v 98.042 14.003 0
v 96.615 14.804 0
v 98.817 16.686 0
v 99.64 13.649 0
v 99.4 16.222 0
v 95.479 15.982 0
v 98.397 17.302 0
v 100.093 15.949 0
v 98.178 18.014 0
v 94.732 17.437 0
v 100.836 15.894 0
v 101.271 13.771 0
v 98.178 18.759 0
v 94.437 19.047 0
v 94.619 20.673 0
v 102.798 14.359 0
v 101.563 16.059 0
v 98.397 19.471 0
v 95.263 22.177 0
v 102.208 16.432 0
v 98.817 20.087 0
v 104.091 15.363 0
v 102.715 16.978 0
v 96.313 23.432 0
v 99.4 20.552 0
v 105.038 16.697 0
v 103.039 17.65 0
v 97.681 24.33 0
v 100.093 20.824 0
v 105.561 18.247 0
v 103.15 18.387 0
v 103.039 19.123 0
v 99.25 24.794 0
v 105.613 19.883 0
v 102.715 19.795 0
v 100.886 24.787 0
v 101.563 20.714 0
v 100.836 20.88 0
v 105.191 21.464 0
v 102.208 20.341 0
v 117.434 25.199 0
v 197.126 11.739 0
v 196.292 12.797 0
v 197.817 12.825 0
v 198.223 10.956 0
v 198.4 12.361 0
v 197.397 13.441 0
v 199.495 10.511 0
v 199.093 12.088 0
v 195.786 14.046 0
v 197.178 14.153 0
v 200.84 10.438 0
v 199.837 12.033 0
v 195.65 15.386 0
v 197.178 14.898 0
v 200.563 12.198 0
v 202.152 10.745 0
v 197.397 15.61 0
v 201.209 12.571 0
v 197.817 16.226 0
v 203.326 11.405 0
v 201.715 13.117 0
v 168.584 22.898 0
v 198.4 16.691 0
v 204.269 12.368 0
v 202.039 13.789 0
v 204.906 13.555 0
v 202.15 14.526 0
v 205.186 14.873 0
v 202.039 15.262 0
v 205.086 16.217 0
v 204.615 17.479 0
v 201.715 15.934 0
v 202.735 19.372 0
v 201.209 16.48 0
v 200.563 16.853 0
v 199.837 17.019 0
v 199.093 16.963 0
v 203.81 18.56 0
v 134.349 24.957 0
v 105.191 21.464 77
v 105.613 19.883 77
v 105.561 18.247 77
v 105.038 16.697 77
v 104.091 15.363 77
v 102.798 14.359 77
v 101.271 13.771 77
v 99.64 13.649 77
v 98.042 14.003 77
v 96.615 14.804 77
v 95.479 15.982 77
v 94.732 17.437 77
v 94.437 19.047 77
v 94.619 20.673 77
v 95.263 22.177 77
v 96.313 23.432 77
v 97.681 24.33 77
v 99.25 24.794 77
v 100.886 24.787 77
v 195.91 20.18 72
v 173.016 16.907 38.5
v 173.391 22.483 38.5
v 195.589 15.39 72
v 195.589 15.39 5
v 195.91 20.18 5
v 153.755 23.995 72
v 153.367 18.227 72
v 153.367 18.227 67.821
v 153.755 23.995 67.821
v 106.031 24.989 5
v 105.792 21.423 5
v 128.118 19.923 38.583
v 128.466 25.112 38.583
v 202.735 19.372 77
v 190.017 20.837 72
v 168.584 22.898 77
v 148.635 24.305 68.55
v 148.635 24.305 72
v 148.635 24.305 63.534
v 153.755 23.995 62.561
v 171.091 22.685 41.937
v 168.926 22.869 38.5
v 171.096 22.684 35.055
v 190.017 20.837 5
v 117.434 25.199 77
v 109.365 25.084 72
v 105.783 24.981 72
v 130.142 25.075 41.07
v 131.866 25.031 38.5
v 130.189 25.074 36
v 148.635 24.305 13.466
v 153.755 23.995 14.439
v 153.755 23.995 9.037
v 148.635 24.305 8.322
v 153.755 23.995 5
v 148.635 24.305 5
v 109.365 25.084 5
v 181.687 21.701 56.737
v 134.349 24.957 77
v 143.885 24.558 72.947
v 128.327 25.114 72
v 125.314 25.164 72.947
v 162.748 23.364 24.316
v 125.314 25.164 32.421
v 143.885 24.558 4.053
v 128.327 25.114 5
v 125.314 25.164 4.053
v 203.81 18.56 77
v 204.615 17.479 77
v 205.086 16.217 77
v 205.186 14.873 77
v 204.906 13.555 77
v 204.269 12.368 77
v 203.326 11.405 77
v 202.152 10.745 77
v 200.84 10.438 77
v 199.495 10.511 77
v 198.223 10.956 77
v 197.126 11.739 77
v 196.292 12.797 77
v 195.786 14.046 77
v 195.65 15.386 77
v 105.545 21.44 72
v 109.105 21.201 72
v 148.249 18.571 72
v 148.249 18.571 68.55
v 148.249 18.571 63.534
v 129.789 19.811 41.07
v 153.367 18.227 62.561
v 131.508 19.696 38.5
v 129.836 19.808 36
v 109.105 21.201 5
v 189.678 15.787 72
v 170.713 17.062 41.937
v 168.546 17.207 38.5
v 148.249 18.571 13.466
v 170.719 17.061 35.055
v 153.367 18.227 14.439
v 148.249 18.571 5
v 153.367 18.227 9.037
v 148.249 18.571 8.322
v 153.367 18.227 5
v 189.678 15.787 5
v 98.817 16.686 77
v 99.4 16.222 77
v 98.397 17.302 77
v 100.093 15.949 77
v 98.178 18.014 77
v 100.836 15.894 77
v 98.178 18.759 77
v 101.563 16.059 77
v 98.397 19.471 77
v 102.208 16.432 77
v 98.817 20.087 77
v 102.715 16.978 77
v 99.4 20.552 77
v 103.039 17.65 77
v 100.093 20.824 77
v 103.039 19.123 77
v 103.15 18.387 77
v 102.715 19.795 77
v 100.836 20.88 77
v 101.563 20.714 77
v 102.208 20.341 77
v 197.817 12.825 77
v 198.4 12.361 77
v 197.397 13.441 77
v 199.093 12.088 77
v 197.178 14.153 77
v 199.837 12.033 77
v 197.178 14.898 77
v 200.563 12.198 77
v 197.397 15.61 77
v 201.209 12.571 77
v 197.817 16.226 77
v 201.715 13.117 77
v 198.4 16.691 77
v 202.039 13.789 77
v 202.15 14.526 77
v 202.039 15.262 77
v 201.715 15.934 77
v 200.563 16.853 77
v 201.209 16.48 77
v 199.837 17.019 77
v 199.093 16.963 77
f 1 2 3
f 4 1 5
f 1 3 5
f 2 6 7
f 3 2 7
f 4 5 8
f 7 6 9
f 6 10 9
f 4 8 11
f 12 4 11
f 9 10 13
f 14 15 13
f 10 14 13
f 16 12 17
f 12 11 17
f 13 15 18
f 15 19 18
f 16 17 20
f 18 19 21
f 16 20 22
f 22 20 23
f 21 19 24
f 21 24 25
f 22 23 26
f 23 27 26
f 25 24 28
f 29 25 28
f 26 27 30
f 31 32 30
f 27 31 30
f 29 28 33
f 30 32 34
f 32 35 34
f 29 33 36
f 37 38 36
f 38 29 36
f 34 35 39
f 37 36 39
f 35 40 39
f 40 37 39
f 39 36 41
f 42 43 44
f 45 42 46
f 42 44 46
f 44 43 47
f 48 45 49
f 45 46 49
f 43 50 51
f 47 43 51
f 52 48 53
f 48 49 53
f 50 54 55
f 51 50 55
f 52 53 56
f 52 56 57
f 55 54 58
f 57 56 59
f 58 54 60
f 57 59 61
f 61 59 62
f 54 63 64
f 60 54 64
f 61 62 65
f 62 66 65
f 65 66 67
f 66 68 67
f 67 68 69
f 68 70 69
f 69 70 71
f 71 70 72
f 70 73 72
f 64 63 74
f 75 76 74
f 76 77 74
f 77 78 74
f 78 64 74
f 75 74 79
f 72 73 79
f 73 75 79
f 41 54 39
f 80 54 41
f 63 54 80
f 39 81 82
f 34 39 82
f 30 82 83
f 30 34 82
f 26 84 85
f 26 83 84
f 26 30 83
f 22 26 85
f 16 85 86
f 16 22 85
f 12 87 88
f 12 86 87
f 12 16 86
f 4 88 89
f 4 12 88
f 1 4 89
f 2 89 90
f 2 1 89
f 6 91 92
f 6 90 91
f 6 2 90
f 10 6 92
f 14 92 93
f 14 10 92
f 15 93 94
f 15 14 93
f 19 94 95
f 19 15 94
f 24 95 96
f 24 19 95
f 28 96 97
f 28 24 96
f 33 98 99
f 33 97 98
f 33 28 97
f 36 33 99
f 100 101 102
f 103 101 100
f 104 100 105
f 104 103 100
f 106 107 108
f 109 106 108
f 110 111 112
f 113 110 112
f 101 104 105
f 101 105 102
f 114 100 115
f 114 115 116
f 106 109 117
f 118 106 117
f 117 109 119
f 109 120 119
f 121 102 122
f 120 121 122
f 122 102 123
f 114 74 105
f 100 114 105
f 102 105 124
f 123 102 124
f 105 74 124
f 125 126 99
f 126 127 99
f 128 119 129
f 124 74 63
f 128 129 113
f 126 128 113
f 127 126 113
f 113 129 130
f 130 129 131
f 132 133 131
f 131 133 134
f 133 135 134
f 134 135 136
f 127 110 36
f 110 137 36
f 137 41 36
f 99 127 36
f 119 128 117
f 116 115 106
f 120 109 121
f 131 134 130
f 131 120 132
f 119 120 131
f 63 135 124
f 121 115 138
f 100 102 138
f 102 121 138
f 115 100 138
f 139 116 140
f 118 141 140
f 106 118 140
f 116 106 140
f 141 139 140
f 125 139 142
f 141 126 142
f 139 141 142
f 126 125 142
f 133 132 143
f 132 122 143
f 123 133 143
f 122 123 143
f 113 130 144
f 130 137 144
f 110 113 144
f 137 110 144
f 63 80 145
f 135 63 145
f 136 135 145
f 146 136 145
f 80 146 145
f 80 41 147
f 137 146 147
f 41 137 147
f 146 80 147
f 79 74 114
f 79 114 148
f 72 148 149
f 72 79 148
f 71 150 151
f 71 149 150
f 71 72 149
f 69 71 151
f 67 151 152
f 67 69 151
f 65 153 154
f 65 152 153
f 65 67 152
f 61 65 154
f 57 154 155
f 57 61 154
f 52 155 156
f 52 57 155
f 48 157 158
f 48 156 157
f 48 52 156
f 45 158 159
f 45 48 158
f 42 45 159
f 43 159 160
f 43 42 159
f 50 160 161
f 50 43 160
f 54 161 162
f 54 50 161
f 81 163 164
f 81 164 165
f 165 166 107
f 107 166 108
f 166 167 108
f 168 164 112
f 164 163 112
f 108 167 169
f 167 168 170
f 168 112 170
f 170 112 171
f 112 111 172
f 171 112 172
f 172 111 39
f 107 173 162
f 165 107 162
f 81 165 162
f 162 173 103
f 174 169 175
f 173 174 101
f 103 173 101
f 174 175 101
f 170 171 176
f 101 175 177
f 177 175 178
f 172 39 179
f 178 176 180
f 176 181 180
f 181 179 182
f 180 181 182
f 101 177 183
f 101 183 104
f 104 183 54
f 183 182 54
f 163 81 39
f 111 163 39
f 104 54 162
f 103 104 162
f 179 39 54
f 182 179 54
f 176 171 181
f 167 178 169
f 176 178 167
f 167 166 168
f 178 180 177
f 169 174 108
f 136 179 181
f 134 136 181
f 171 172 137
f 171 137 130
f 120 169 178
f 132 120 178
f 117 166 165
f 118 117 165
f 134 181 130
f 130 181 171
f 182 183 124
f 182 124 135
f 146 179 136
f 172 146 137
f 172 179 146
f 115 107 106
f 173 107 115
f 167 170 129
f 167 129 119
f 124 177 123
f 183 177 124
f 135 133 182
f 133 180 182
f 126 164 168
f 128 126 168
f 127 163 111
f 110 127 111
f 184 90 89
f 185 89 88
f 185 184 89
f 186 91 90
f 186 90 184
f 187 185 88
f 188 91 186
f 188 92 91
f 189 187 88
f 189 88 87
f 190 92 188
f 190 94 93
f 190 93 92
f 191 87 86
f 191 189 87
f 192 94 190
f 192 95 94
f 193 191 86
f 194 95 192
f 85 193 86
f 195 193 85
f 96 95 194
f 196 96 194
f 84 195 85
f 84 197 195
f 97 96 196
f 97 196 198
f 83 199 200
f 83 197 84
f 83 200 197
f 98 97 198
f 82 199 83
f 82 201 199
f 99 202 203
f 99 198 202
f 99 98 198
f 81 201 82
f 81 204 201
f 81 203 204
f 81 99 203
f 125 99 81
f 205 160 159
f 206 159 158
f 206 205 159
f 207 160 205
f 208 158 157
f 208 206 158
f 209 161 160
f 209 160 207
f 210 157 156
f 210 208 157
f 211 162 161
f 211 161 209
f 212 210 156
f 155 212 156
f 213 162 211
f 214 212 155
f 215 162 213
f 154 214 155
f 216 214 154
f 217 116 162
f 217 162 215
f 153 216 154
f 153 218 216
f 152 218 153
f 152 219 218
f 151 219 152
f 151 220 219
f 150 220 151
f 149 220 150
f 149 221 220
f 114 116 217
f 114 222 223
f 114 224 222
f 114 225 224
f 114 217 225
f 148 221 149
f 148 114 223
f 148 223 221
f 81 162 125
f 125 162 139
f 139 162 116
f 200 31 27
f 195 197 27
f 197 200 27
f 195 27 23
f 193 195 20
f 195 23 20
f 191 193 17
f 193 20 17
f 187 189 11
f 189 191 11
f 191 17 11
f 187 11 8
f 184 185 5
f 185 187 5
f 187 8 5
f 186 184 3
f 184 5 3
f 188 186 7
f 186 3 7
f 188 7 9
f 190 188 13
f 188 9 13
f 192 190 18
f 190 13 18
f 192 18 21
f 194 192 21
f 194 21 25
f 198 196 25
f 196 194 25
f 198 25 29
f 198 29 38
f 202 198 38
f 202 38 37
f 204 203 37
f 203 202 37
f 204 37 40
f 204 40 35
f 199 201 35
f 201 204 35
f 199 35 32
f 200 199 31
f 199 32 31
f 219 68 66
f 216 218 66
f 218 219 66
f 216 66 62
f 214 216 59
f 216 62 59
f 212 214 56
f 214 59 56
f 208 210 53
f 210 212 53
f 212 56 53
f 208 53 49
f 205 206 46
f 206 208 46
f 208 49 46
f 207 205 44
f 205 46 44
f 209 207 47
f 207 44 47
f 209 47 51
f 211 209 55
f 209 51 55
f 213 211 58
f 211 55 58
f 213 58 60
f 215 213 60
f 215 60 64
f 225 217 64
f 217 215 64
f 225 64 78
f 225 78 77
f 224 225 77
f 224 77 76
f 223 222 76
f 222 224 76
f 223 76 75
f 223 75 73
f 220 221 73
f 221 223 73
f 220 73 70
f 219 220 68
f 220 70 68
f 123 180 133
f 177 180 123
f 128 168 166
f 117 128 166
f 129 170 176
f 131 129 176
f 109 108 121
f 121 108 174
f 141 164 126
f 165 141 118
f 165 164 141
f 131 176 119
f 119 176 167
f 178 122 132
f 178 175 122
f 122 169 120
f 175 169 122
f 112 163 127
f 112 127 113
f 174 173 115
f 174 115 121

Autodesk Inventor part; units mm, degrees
ref_plane "YZ Plane" through (0, 0, 0) normal (1, 0, 0) x (0, 1, 0)
ref_plane "XZ Plane" through (0, 0, 0) normal (0, 1, 0) x (-1, 0, 0)
ref_plane "XY Plane" through (0, 0, 0) normal (0, 0, 1) x (1, 0, 0)
sketch "Sketch2" plane through (0, 0, 0) normal (0, 0, 1) x (1, 0, 0)
  spline S0 degree 5 number of poles 204
  circle A0 centre (79.5137, 4.5678) radius 15.1135
  line L0 (79.5137, 4.5678) -> (79.5137, -15.4763) construction
  line L1 (79.5137, 4.5678) -> (209.6498, 4.5678) construction
  line L2 (319.6498, 0.0573) -> (219.6498, 0.0573) construction
  line L3 (219.6499, 18.7671) -> (219.6499, 18.7671) construction
  line L4 (28.0055, 4.5054) -> (28.0055, -2.4946)
  line L5 (19.6272, 1.0326) -> (319.6498, 0.0573) construction
  line L6 (49.7105, 14.4213) -> (55.6079, 14.4213)
  line L7 (49.7104, -8.4915) -> (55.6078, -8.4915)
  line L8 (28.0055, 4.5054) -> (49.7105, 14.4213)
  line L9 (28.0055, -2.4946) -> (49.7104, -8.4915)
  line L10 (55.6079, 14.4213) -> (55.6079, 20.8729)
  line L11 (55.6078, -8.4915) -> (55.6078, -14.1513)
  line L12 (108.6496, 16.3299) -> (108.6496, -7.1942)
  line L13 (110.8735, -9.1817) -> (193.8736, 0.1678)
  line L14 (195.6498, 2.1552) -> (195.6498, 6.9805)
  arc A1 (108.6496, -7.1942) -> (110.8735, -9.1817) centre (110.6496, -7.1942) ccw
  arc A2 (193.8736, 0.1678) -> (195.6498, 2.1552) centre (193.6498, 2.1552) ccw
  circle A3 centre (209.6498, 0.0573) radius 6.214
  line L15 (108.6496, 18.5678) -> (195.6498, 8.7678)
  circle A4 centre (100.6496, 18.3866) radius 2.5
  circle A5 centre (199.6498, 14.5256) radius 2.5
  spline S1 degree 4 poles (202.7347, 19.3724) (199.838, 19.7251) (195.7649, 20.2061) (190.5032, 20.7952) (184.0435, 21.4697) (179.3239, 21.937) (174.5933, 22.3806) (169.8562, 22.7962) (165.1183, 23.1863) (160.3828, 23.5463) (155.6566, 23.8767) (150.936, 24.1762) (146.2498, 24.4444) (141.5311, 24.676) (136.9019, 24.8782) (132.2312, 25.0296) (127.6189, 25.1375) (123.0371, 25.1982) (118.5028, 25.2125) (112.3622, 25.1677) (107.3995, 25.0507) (103.5849, 24.9119) (100.8865, 24.7866) knots 0 0 0 0 0 0.114234 0.16008 0.206003 0.251978 0.297982 0.343994 0.389991 0.435949 0.481846 0.527693 0.573431 0.619092 0.664656 0.710064 0.755333 0.800383 0.845191 0.889734 1 1 1 1 1
  line L16 (105.191, 21.4637) -> (195.6498, 15.3862)
  arc A6 (100.8865, 24.7866) -> (105.191, 21.4637) centre (100.0416, 19.2427) ccw
  arc A7 (195.6498, 15.3862) -> (202.7347, 19.3724) centre (200.4212, 15.1951) ccw
  point P0 (0, 0)
  point P1 (319.5771, 0.0748)
  point P2 (319.3573, 0.1272)
  point P3 (318.9916, 0.2136)
  point P4 (318.4804, 0.3362)
  point P5 (317.8238, 0.4909)
  point P6 (317.0222, 0.6802)
  point P7 (316.0769, 0.9024)
  point P8 (314.9885, 1.1569)
  point P9 (313.7582, 1.443)
  point P10 (312.3866, 1.7598)
  point P11 (310.8752, 2.1063)
  point P12 (309.2258, 2.4819)
  point P13 (307.4393, 2.8854)
  point P14 (305.5178, 3.3153)
  point P15 (303.4628, 3.7707)
  point P16 (301.2764, 4.2501)
  point P17 (298.9607, 4.7526)
  point P18 (296.5175, 5.2764)
  point P19 (293.9492, 5.8203)
  point P20 (291.2585, 6.3828)
  point P21 (288.4478, 6.9627)
  point P22 (285.5195, 7.5582)
  point P23 (282.4766, 8.1678)
  point P24 (279.3218, 8.79)
  point P25 (276.0584, 9.4236)
  point P26 (272.6891, 10.0668)
  point P27 (269.2175, 10.7178)
  point P28 (265.6469, 11.3757)
  point P29 (261.9803, 12.0381)
  point P30 (258.2219, 12.7041)
  point P31 (254.3747, 13.3722)
  point P32 (250.4426, 14.0403)
  point P33 (246.4295, 14.7072)
  point P34 (242.339, 15.3714)
  point P35 (238.1756, 16.0311)
  point P36 (233.9428, 16.6851)
  point P37 (229.6454, 17.3316)
  point P38 (225.2869, 17.9694)
  point P39 (220.8723, 18.5967)
  point P40 (216.4049, 19.2123)
  point P41 (211.8901, 19.8144)
  point P42 (207.332, 20.4015)
  point P43 (202.7347, 20.9724)
  point P44 (198.1034, 21.5256)
  point P45 (193.4423, 22.0596)
  point P46 (188.7563, 22.5726)
  point P47 (184.0499, 23.0637)
  point P48 (179.3279, 23.5314)
  point P49 (174.5948, 23.9745)
  point P50 (169.8554, 24.3909)
  point P51 (165.1148, 24.7803)
  point P52 (160.3775, 25.1406)
  point P53 (155.6479, 25.4709)
  point P54 (150.9316, 25.7703)
  point P55 (146.233, 26.0373)
  point P56 (141.557, 26.2707)
  point P57 (136.8821, 26.4681)
  point P58 (132.2209, 26.6211)
  point P59 (127.5964, 26.7282)
  point P60 (123.0133, 26.7888)
  point P61 (118.4761, 26.8026)
  point P62 (113.9902, 26.7693)
  point P63 (109.5601, 26.6886)
  point P64 (105.191, 26.5611)
  point P65 (100.8865, 26.3866)
  point P66 (96.6524, 26.1647)
  point P67 (92.4927, 25.8975)
  point P68 (88.412, 25.5858)
  point P69 (84.409, 25.3061)
  point P70 (80.8803, 24.9766)
  point P71 (76.6761, 24.4558)
  point P72 (72.9631, 23.8932)
  point P73 (69.3402, 23.3612)
  point P74 (65.8208, 22.7938)
  point P75 (62.4086, 22.1884)
  point P76 (59.1071, 21.5462)
  point P77 (52.8493, 20.1606)
  point P78 (49.7107, 19.4213)
  point P79 (47.0737, 18.6508)
  point P80 (44.3741, 17.8542)
  point P81 (41.8033, 17.0323)
  point P82 (39.3638, 16.1875)
  point P83 (37.0582, 15.3214)
  point P84 (34.8883, 14.4364)
  point P85 (32.8567, 13.534)
  point P86 (30.9649, 12.6166)
  point P87 (29.2144, 11.686)
  point P88 (27.607, 10.7437)
  point P89 (26.1442, 9.7921)
  point P90 (24.8269, 8.8324)
  point P91 (23.6566, 7.8664)
  point P92 (22.6337, 6.8952)
  point P93 (21.7592, 5.9208)
  point P94 (21.0335, 4.944)
  point P95 (20.4573, 3.966)
  point P96 (20.031, 2.9874)
  point P97 (19.7541, 2.0097)
  point P98 (19.6496, 0.0598)
  point P99 (19.8207, -0.9032)
  point P100 (20.1378, -1.8356)
  point P101 (20.6004, -2.7401)
  point P102 (21.2081, -3.6158)
  point P103 (21.9599, -4.4627)
  point P104 (22.8545, -5.2806)
  point P105 (23.891, -6.069)
  point P106 (25.0682, -6.8277)
  point P107 (26.3845, -7.5561)
  point P108 (27.8383, -8.2539)
  point P109 (29.4283, -8.9211)
  point P110 (31.1522, -9.5571)
  point P111 (33.0086, -10.1613)
  point P112 (34.9949, -10.734)
  point P113 (37.1093, -11.2746)
  point P114 (39.3497, -11.7828)
  point P115 (41.7134, -12.2586)
  point P116 (44.1979, -12.702)
  point P117 (46.8014, -13.1127)
  point P118 (49.7105, -13.4915)
  point P119 (52.3532, -13.8357)
  point P120 (58.3469, -14.4294)
  point P121 (61.5023, -14.678)
  point P122 (64.7591, -14.8953)
  point P123 (68.1149, -15.0813)
  point P124 (71.5661, -15.237)
  point P125 (75.1094, -15.3627)
  point P126 (78.7418, -15.4596)
  point P127 (82.46, -15.528)
  point P128 (86.2607, -15.5691)
  point P129 (90.14, -15.5838)
  point P130 (94.0946, -15.5733)
  point P131 (98.1212, -15.5388)
  point P132 (102.2159, -15.4812)
  point P133 (106.3751, -15.4023)
  point P134 (110.5952, -15.303)
  point P135 (114.872, -15.1845)
  point P136 (119.2022, -15.0489)
  point P137 (123.5813, -14.8971)
  point P138 (128.006, -14.7306)
  point P139 (132.4718, -14.5509)
  point P140 (136.9748, -14.3598)
  point P141 (141.5285, -14.1576)
  point P142 (146.1365, -13.9383)
  point P143 (150.7679, -13.7022)
  point P144 (155.4191, -13.4499)
  point P145 (160.0853, -13.1829)
  point P146 (164.7617, -12.9024)
  point P147 (169.4444, -12.6099)
  point P148 (174.1283, -12.306)
  point P149 (178.8092, -11.9925)
  point P150 (183.4823, -11.67)
  point P151 (188.1434, -11.34)
  point P152 (192.7877, -11.0037)
  point P153 (197.4107, -10.6614)
  point P154 (202.0079, -10.3149)
  point P155 (206.5747, -9.9645)
  point P156 (211.1069, -9.6117)
  point P157 (215.5999, -9.2568)
  point P158 (220.0489, -8.9007)
  point P159 (224.4503, -8.5446)
  point P160 (228.7987, -8.1885)
  point P161 (233.0906, -7.8339)
  point P162 (237.3214, -7.4808)
  point P163 (241.4866, -7.1298)
  point P164 (245.5828, -6.7821)
  point P165 (249.6052, -6.4377)
  point P166 (253.5502, -6.0972)
  point P167 (257.4136, -5.7612)
  point P168 (261.1915, -5.4303)
  point P169 (264.88, -5.1051)
  point P170 (268.4758, -4.7856)
  point P171 (271.9747, -4.4724)
  point P172 (275.3734, -4.1661)
  point P173 (278.6686, -3.867)
  point P174 (281.8564, -3.5757)
  point P175 (284.9344, -3.2925)
  point P176 (287.8984, -3.018)
  point P177 (290.7463, -2.7525)
  point P178 (293.4745, -2.4963)
  point P179 (296.0806, -2.2503)
  point P180 (298.5616, -2.0142)
  point P181 (300.9151, -1.7892)
  point P182 (303.1387, -1.575)
  point P183 (305.23, -1.3728)
  point P184 (307.1866, -1.1823)
  point P185 (309.007, -1.0041)
  point P186 (310.6885, -0.8385)
  point P187 (312.2302, -0.6861)
  point P188 (313.6297, -0.5471)
  point P189 (314.8861, -0.4221)
  point P190 (315.9976, -0.3107)
  point P191 (316.9636, -0.214)
  point P192 (317.7826, -0.1311)
  point P193 (318.4538, -0.0643)
  point P194 (318.9765, -0.0102)
  point P195 (319.3503, 0.027)
  point P196 (319.5743, 0.0497)
  point P197 (28.0055, 1.0054)
  point P198 (108.6496, -9.4322)
  point P199 (195.6498, 0.3678)
  dimension "d37" = 30.227
  dimension "d2" = 300.0001
  dimension "d19" = 110
  dimension "d22" = 100
  dimension "d23" = 7
  dimension "d24" = 5
  dimension "d25" = 5
  dimension "d30" = 28
  dimension "d31" = 8.4
  dimension "d33" = 14
  dimension "d39" = 59.8865
  dimension "d42" = 12.428
  dimension "d43" = 5
  dimension "d44" = 5
  dimension "d49" = 1.6
  dimension "d50" = 1.6
  dimension "d51" = 1.6
  dimension "d52" = 1.6
  dimension "d53" = 1.6
  dimension "d54" = 1.6
  dimension "d55" = 1.6
  dimension "d56" = 1.6
  dimension "d57" = 1.6
  dimension "d58" = 1.6
  dimension "d59" = 1.6
  dimension "d60" = 1.6
  dimension "d61" = 1.6
  dimension "d62" = 1.6
  dimension "d63" = 1.6
  dimension "d64" = 1.6
  dimension "d65" = 1.6
  dimension "d66" = 1.6
  dimension "d67" = 1.6
  dimension "d68" = 1.6
  dimension "d69" = 1.6
  dimension "d70" = 1.6
  dimension "d72" = 1.6
  dimension "d75" = 4
  dimension "d76" = 7
extrude "Extrusion8" add sketch "Sketch2" along normal blind 77 contours A7 L16 A6 S1
sketch "Sketch3" plane through (195.6498, 15.3862, 0) normal (-0.067, -0.9978, 0) x (0.9978, -0.067, 0)
  line L0 (-0.0611, 72) -> (-0.0611, 5)
  line L1 (-0.0611, 5) -> (-22.6844, 38.5)
  line L2 (-22.6844, 38.5) -> (-0.0611, 72)
  line L3 (-67.6844, 38.5829) -> (-45.1844, 72)
  line L4 (-45.1844, 72) -> (-45.1844, 4.8387)
  line L5 (-45.1844, 4.8387) -> (-67.6844, 38.5829)
  line L6 (-45.1844, 72) -> (-22.6844, 38.5)
  line L7 (-45.1844, 4.8387) -> (-22.6844, 38.5)
  line L8 (9.5487, 77) -> (0, 77) projected
  line L9 (9.5487, 0) -> (0, 0) projected
  line L10 (-90.3076, 72) -> (-90.0608, 5)
  line L11 (-90.0608, 5) -> (-67.6844, 38.5829)
  line L12 (-90.3076, 72) -> (-67.6844, 38.5829)
  line L13 (-90.0437, 77) -> (-101.2596, 77) projected
  line L14 (-90.0437, 0) -> (-101.2596, 0) projected
  line L15 (-90.3076, 72) -> (-0.0611, 72)
  line L16 (-0.0611, 5) -> (-90.0608, 5)
  line L17 (-86.7403, 72) -> (-45.0762, 9.8387)
  line L18 (-86.7403, 5) -> (-45.1844, 67)
  line L19 (-45.1844, 67) -> (-5.985, 5)
  line L20 (-5.985, 72) -> (-45.1844, 10)
  line L21 (-47.5072, 5) -> (-47.5072, 72)
  line L22 (-42.3779, 72) -> (-42.3779, 5)
  point P0 (-194.1783, 0)
  point P1 (-90.6627, 0)
  point P2 (-45.1844, 38.4194)
  point P3 (6.8018, 77)
  point P4 (6.8018, 0)
  point P5 (-95.1802, 77)
  point P6 (-90.6627, 77)
  point P7 (-95.1802, 0)
  point P8 (-27.1653, 38.5)
  point P9 (-64.2867, 38.5)
  point P10 (-24.9925, 41.9366)
  point P11 (-45.2266, 49)
  point P12 (-66.0095, 41.0704)
  point P13 (-45.2288, 49)
  point P14 (-24.9871, 35.0549)
  point P15 (-65.9622, 36.0001)
  point P16 (-42.3779, 9.0373)
  point P17 (-42.3779, 62.5611)
  point P18 (-42.3779, 14.4389)
  point P19 (-42.3779, 67.8215)
  point P20 (-47.5072, 68.5501)
  point P21 (-47.5072, 8.3224)
  point P22 (-47.5072, 13.4656)
  point P23 (-47.5072, 63.5344)
  dimension "d81" = 22.5
  dimension "d82" = 22.5
  dimension "d83" = 5
  dimension "d84" = 5
  dimension "d85" = 22.5
  dimension "d86" = 5
  dimension "d87" = 5
  dimension "d90" = 5
  dimension "d91" = 5
extrude "Extrusion9" cut sketch "Sketch3" against normal blind 10 contours L0 L1 L2 | L20 L6 L22 L15 | L16 L22 L7 L19 | L20 L22 L19 | L3 L17 L15 L21 | L21 L17 L18 | L11 L10 L12 | L21 L16 L18 L5
properties part number "2414 basic aerofoil" material "Plywood, Finish"
